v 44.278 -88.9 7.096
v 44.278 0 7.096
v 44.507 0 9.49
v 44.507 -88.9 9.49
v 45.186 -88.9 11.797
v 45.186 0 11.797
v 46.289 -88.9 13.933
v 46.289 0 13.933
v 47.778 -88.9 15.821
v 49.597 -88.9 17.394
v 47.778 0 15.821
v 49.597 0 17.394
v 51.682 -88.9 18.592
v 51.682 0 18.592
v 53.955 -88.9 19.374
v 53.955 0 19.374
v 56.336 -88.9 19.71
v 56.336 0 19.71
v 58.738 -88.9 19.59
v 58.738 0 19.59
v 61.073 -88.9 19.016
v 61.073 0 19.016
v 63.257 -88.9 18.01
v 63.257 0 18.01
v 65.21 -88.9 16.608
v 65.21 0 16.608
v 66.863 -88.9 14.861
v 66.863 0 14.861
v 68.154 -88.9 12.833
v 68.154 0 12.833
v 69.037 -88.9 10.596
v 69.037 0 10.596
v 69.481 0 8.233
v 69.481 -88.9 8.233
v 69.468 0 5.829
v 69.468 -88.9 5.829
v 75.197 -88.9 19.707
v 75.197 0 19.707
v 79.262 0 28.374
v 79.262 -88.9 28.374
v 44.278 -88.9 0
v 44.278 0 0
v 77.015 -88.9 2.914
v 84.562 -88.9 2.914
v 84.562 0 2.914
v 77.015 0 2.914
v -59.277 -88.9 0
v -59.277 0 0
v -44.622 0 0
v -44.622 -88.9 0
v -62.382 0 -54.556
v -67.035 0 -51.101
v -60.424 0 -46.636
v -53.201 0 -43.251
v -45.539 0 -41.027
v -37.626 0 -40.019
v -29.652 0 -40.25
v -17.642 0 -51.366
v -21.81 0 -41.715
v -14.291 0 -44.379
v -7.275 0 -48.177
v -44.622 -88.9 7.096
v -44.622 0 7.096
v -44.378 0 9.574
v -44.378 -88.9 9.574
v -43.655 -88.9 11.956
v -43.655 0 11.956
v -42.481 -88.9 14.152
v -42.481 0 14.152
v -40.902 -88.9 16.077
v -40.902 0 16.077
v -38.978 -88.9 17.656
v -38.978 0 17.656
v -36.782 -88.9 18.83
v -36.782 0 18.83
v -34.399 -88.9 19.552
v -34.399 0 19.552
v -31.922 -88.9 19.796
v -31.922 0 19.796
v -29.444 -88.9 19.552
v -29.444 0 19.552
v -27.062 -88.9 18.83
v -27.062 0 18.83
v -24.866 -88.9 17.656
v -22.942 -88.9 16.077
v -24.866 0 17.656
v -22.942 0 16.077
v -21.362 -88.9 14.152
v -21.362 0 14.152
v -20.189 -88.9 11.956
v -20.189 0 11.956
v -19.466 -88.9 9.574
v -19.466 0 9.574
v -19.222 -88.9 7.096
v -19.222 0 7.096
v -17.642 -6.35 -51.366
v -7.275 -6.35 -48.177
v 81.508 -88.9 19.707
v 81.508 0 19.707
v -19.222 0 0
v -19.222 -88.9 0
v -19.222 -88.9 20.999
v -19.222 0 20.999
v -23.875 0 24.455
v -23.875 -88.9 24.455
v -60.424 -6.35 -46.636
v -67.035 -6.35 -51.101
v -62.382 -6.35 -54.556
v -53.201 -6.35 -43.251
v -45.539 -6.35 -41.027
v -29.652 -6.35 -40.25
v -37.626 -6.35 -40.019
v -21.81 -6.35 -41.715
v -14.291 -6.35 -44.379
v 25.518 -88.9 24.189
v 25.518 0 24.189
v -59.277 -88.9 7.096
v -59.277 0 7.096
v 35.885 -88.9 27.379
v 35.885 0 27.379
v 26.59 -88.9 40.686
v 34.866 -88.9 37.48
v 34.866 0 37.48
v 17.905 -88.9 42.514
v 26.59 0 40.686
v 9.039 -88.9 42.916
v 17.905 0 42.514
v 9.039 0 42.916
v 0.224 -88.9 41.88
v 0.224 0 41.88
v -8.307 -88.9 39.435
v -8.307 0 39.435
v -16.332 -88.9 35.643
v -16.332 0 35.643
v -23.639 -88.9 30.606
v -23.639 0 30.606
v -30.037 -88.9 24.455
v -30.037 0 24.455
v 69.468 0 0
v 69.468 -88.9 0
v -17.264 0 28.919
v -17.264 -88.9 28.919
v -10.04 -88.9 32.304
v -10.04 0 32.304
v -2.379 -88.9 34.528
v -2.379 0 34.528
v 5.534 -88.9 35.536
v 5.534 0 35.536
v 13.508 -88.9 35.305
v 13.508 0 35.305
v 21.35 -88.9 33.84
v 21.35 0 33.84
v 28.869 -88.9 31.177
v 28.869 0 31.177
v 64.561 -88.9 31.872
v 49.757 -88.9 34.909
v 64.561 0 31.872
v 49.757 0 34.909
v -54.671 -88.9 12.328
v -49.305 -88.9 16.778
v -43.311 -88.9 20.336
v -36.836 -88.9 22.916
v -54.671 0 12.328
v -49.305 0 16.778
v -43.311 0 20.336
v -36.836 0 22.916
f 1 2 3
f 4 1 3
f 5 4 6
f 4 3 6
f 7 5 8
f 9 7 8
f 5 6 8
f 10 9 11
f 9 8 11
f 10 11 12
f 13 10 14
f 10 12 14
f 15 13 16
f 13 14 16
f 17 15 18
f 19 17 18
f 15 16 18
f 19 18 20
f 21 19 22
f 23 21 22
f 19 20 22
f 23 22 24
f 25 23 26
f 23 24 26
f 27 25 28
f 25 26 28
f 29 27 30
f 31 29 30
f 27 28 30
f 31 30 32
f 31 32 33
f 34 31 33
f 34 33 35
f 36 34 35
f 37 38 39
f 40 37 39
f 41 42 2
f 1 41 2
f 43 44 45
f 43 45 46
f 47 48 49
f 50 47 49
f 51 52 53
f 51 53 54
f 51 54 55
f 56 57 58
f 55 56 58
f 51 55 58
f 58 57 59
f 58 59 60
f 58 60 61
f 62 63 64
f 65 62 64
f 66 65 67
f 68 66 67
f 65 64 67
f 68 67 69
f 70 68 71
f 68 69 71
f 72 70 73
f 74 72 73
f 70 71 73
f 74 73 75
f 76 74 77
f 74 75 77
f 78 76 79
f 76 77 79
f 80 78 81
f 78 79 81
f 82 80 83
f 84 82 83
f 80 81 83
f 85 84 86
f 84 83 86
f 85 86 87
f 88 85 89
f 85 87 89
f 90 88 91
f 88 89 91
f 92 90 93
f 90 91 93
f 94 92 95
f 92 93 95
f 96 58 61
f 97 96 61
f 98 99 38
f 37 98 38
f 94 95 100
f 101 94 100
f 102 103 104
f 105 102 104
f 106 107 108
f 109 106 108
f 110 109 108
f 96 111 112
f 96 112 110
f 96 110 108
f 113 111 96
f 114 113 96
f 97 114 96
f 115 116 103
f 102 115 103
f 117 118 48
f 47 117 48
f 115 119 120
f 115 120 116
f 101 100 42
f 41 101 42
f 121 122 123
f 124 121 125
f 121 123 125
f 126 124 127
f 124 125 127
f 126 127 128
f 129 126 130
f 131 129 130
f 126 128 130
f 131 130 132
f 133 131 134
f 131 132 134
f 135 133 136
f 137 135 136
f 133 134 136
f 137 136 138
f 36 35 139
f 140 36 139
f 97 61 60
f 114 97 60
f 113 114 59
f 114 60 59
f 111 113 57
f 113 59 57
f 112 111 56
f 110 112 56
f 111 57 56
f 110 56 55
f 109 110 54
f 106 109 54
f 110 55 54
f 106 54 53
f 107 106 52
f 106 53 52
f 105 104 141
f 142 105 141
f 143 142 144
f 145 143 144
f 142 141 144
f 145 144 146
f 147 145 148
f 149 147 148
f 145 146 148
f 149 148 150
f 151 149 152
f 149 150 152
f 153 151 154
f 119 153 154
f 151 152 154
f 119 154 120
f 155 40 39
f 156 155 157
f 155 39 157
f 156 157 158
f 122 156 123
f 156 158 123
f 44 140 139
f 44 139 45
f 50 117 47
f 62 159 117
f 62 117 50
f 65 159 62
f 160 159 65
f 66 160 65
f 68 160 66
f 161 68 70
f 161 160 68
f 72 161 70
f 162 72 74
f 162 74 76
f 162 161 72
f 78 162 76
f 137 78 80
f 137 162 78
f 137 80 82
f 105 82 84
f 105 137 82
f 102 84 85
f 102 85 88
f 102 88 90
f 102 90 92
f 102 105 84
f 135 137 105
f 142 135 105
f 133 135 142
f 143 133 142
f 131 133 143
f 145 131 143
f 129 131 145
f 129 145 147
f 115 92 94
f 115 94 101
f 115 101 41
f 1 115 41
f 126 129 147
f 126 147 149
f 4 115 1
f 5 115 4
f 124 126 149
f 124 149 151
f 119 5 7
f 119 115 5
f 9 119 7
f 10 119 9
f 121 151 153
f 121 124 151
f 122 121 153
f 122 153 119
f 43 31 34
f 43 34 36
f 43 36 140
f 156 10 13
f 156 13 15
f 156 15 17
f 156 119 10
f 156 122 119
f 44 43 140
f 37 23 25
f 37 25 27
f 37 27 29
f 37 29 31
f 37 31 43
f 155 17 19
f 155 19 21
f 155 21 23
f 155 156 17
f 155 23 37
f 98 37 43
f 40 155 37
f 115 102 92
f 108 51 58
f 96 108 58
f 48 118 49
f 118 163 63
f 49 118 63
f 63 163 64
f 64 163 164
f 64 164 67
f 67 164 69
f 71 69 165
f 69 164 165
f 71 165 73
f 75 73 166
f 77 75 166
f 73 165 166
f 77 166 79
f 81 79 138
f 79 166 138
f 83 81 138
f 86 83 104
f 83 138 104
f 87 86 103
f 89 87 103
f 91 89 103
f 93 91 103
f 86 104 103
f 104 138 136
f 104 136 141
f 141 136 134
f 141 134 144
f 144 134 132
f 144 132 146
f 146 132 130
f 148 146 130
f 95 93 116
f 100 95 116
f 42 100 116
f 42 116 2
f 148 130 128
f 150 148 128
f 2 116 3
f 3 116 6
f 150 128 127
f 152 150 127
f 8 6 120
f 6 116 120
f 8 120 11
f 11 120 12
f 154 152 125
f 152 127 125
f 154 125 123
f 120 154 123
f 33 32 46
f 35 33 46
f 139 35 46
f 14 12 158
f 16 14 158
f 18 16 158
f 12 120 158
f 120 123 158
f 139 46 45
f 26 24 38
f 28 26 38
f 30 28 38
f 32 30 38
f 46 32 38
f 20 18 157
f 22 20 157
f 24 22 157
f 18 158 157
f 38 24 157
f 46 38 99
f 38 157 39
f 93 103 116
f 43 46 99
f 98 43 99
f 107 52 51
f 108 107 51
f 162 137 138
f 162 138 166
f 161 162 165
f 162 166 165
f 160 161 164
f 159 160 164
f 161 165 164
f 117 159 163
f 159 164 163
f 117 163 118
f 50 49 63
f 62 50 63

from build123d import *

# Parameters (mm, degrees)
F1_DEPTH = 88.9
F3_DEPTH = 6.35


with BuildPart() as f1:
    # F0 (on Front) → F1 (new body)
    with BuildSketch(Plane.XZ):
        with BuildLine():
            Line((-59.276514, 0), (-44.621789, 0))
            Line((-44.621789, 0), (-44.621789, 7.096321))
            ThreePointArc((-44.621789, 7.096321), (-31.921789, 19.796321), (-19.221789, 7.096321))
            Line((-19.221789, 7.096321), (-19.221789, 0))
            Line((-19.221789, 0), (44.278211, 0))
            Line((44.278211, 0), (44.278211, 7.096321))
            ThreePointArc((44.278211, 7.096321), (57.539896, 19.707353), (69.468394, 5.828543))
            Line((69.468394, 5.828543), (69.468394, 0))
            Line((69.468394, 0), (84.562103, 2.914272))
            Line((84.562103, 2.914272), (77.015249, 2.914272))
            Line((77.015249, 2.914272), (81.507926, 19.707353))
            Line((81.507926, 19.707353), (75.196942, 19.707353))
            Line((75.196942, 19.707353), (79.261587, 28.374125))
            ThreePointArc((79.261587, 28.374125), (57.170737, 33.448537), (34.865929, 37.479769))
            ThreePointArc((34.865929, 37.479769), (0.224474, 41.880093), (-30.036977, 24.454884))
            ThreePointArc((-30.036977, 24.454884), (-46.377732, 18.674509), (-59.276514, 7.096321))
            Line((-59.276514, 7.096321), (-54.491863, 3.54816))
            Line((-54.491863, 3.54816), (-59.276514, 0))
        make_face()
        with BuildLine():
            Line((-19.221789, 20.999303), (-23.875274, 24.454884))
            ThreePointArc((-23.875274, 24.454884), (5.534135, 35.536499), (35.884887, 27.378837))
            Line((35.884887, 27.378837), (25.51814, 24.18907))
            Line((25.51814, 24.18907), (-19.221789, 20.999303))
        make_face(mode=Mode.SUBTRACT)
        Polygon((-59.276514, 7.096321), (-59.276514, 0), (-54.491863, 3.54816), align=None)
    extrude(amount=F1_DEPTH)


with BuildPart() as f3:
    # F2 (on Front) → F3 (new body)
    with BuildSketch(Plane.XZ):
        with BuildLine():
            ThreePointArc((-7.275198, -48.176653), (-37.625949, -40.018991), (-67.035359, -51.100606))
            Line((-67.035359, -51.100606), (-62.381874, -54.556187))
            Line((-62.381874, -54.556187), (-17.641945, -51.36642))
            Line((-17.641945, -51.36642), (-7.275198, -48.176653))
        make_face()
    extrude(amount=F3_DEPTH)


solid = Compound([f1.part, f3.part])
